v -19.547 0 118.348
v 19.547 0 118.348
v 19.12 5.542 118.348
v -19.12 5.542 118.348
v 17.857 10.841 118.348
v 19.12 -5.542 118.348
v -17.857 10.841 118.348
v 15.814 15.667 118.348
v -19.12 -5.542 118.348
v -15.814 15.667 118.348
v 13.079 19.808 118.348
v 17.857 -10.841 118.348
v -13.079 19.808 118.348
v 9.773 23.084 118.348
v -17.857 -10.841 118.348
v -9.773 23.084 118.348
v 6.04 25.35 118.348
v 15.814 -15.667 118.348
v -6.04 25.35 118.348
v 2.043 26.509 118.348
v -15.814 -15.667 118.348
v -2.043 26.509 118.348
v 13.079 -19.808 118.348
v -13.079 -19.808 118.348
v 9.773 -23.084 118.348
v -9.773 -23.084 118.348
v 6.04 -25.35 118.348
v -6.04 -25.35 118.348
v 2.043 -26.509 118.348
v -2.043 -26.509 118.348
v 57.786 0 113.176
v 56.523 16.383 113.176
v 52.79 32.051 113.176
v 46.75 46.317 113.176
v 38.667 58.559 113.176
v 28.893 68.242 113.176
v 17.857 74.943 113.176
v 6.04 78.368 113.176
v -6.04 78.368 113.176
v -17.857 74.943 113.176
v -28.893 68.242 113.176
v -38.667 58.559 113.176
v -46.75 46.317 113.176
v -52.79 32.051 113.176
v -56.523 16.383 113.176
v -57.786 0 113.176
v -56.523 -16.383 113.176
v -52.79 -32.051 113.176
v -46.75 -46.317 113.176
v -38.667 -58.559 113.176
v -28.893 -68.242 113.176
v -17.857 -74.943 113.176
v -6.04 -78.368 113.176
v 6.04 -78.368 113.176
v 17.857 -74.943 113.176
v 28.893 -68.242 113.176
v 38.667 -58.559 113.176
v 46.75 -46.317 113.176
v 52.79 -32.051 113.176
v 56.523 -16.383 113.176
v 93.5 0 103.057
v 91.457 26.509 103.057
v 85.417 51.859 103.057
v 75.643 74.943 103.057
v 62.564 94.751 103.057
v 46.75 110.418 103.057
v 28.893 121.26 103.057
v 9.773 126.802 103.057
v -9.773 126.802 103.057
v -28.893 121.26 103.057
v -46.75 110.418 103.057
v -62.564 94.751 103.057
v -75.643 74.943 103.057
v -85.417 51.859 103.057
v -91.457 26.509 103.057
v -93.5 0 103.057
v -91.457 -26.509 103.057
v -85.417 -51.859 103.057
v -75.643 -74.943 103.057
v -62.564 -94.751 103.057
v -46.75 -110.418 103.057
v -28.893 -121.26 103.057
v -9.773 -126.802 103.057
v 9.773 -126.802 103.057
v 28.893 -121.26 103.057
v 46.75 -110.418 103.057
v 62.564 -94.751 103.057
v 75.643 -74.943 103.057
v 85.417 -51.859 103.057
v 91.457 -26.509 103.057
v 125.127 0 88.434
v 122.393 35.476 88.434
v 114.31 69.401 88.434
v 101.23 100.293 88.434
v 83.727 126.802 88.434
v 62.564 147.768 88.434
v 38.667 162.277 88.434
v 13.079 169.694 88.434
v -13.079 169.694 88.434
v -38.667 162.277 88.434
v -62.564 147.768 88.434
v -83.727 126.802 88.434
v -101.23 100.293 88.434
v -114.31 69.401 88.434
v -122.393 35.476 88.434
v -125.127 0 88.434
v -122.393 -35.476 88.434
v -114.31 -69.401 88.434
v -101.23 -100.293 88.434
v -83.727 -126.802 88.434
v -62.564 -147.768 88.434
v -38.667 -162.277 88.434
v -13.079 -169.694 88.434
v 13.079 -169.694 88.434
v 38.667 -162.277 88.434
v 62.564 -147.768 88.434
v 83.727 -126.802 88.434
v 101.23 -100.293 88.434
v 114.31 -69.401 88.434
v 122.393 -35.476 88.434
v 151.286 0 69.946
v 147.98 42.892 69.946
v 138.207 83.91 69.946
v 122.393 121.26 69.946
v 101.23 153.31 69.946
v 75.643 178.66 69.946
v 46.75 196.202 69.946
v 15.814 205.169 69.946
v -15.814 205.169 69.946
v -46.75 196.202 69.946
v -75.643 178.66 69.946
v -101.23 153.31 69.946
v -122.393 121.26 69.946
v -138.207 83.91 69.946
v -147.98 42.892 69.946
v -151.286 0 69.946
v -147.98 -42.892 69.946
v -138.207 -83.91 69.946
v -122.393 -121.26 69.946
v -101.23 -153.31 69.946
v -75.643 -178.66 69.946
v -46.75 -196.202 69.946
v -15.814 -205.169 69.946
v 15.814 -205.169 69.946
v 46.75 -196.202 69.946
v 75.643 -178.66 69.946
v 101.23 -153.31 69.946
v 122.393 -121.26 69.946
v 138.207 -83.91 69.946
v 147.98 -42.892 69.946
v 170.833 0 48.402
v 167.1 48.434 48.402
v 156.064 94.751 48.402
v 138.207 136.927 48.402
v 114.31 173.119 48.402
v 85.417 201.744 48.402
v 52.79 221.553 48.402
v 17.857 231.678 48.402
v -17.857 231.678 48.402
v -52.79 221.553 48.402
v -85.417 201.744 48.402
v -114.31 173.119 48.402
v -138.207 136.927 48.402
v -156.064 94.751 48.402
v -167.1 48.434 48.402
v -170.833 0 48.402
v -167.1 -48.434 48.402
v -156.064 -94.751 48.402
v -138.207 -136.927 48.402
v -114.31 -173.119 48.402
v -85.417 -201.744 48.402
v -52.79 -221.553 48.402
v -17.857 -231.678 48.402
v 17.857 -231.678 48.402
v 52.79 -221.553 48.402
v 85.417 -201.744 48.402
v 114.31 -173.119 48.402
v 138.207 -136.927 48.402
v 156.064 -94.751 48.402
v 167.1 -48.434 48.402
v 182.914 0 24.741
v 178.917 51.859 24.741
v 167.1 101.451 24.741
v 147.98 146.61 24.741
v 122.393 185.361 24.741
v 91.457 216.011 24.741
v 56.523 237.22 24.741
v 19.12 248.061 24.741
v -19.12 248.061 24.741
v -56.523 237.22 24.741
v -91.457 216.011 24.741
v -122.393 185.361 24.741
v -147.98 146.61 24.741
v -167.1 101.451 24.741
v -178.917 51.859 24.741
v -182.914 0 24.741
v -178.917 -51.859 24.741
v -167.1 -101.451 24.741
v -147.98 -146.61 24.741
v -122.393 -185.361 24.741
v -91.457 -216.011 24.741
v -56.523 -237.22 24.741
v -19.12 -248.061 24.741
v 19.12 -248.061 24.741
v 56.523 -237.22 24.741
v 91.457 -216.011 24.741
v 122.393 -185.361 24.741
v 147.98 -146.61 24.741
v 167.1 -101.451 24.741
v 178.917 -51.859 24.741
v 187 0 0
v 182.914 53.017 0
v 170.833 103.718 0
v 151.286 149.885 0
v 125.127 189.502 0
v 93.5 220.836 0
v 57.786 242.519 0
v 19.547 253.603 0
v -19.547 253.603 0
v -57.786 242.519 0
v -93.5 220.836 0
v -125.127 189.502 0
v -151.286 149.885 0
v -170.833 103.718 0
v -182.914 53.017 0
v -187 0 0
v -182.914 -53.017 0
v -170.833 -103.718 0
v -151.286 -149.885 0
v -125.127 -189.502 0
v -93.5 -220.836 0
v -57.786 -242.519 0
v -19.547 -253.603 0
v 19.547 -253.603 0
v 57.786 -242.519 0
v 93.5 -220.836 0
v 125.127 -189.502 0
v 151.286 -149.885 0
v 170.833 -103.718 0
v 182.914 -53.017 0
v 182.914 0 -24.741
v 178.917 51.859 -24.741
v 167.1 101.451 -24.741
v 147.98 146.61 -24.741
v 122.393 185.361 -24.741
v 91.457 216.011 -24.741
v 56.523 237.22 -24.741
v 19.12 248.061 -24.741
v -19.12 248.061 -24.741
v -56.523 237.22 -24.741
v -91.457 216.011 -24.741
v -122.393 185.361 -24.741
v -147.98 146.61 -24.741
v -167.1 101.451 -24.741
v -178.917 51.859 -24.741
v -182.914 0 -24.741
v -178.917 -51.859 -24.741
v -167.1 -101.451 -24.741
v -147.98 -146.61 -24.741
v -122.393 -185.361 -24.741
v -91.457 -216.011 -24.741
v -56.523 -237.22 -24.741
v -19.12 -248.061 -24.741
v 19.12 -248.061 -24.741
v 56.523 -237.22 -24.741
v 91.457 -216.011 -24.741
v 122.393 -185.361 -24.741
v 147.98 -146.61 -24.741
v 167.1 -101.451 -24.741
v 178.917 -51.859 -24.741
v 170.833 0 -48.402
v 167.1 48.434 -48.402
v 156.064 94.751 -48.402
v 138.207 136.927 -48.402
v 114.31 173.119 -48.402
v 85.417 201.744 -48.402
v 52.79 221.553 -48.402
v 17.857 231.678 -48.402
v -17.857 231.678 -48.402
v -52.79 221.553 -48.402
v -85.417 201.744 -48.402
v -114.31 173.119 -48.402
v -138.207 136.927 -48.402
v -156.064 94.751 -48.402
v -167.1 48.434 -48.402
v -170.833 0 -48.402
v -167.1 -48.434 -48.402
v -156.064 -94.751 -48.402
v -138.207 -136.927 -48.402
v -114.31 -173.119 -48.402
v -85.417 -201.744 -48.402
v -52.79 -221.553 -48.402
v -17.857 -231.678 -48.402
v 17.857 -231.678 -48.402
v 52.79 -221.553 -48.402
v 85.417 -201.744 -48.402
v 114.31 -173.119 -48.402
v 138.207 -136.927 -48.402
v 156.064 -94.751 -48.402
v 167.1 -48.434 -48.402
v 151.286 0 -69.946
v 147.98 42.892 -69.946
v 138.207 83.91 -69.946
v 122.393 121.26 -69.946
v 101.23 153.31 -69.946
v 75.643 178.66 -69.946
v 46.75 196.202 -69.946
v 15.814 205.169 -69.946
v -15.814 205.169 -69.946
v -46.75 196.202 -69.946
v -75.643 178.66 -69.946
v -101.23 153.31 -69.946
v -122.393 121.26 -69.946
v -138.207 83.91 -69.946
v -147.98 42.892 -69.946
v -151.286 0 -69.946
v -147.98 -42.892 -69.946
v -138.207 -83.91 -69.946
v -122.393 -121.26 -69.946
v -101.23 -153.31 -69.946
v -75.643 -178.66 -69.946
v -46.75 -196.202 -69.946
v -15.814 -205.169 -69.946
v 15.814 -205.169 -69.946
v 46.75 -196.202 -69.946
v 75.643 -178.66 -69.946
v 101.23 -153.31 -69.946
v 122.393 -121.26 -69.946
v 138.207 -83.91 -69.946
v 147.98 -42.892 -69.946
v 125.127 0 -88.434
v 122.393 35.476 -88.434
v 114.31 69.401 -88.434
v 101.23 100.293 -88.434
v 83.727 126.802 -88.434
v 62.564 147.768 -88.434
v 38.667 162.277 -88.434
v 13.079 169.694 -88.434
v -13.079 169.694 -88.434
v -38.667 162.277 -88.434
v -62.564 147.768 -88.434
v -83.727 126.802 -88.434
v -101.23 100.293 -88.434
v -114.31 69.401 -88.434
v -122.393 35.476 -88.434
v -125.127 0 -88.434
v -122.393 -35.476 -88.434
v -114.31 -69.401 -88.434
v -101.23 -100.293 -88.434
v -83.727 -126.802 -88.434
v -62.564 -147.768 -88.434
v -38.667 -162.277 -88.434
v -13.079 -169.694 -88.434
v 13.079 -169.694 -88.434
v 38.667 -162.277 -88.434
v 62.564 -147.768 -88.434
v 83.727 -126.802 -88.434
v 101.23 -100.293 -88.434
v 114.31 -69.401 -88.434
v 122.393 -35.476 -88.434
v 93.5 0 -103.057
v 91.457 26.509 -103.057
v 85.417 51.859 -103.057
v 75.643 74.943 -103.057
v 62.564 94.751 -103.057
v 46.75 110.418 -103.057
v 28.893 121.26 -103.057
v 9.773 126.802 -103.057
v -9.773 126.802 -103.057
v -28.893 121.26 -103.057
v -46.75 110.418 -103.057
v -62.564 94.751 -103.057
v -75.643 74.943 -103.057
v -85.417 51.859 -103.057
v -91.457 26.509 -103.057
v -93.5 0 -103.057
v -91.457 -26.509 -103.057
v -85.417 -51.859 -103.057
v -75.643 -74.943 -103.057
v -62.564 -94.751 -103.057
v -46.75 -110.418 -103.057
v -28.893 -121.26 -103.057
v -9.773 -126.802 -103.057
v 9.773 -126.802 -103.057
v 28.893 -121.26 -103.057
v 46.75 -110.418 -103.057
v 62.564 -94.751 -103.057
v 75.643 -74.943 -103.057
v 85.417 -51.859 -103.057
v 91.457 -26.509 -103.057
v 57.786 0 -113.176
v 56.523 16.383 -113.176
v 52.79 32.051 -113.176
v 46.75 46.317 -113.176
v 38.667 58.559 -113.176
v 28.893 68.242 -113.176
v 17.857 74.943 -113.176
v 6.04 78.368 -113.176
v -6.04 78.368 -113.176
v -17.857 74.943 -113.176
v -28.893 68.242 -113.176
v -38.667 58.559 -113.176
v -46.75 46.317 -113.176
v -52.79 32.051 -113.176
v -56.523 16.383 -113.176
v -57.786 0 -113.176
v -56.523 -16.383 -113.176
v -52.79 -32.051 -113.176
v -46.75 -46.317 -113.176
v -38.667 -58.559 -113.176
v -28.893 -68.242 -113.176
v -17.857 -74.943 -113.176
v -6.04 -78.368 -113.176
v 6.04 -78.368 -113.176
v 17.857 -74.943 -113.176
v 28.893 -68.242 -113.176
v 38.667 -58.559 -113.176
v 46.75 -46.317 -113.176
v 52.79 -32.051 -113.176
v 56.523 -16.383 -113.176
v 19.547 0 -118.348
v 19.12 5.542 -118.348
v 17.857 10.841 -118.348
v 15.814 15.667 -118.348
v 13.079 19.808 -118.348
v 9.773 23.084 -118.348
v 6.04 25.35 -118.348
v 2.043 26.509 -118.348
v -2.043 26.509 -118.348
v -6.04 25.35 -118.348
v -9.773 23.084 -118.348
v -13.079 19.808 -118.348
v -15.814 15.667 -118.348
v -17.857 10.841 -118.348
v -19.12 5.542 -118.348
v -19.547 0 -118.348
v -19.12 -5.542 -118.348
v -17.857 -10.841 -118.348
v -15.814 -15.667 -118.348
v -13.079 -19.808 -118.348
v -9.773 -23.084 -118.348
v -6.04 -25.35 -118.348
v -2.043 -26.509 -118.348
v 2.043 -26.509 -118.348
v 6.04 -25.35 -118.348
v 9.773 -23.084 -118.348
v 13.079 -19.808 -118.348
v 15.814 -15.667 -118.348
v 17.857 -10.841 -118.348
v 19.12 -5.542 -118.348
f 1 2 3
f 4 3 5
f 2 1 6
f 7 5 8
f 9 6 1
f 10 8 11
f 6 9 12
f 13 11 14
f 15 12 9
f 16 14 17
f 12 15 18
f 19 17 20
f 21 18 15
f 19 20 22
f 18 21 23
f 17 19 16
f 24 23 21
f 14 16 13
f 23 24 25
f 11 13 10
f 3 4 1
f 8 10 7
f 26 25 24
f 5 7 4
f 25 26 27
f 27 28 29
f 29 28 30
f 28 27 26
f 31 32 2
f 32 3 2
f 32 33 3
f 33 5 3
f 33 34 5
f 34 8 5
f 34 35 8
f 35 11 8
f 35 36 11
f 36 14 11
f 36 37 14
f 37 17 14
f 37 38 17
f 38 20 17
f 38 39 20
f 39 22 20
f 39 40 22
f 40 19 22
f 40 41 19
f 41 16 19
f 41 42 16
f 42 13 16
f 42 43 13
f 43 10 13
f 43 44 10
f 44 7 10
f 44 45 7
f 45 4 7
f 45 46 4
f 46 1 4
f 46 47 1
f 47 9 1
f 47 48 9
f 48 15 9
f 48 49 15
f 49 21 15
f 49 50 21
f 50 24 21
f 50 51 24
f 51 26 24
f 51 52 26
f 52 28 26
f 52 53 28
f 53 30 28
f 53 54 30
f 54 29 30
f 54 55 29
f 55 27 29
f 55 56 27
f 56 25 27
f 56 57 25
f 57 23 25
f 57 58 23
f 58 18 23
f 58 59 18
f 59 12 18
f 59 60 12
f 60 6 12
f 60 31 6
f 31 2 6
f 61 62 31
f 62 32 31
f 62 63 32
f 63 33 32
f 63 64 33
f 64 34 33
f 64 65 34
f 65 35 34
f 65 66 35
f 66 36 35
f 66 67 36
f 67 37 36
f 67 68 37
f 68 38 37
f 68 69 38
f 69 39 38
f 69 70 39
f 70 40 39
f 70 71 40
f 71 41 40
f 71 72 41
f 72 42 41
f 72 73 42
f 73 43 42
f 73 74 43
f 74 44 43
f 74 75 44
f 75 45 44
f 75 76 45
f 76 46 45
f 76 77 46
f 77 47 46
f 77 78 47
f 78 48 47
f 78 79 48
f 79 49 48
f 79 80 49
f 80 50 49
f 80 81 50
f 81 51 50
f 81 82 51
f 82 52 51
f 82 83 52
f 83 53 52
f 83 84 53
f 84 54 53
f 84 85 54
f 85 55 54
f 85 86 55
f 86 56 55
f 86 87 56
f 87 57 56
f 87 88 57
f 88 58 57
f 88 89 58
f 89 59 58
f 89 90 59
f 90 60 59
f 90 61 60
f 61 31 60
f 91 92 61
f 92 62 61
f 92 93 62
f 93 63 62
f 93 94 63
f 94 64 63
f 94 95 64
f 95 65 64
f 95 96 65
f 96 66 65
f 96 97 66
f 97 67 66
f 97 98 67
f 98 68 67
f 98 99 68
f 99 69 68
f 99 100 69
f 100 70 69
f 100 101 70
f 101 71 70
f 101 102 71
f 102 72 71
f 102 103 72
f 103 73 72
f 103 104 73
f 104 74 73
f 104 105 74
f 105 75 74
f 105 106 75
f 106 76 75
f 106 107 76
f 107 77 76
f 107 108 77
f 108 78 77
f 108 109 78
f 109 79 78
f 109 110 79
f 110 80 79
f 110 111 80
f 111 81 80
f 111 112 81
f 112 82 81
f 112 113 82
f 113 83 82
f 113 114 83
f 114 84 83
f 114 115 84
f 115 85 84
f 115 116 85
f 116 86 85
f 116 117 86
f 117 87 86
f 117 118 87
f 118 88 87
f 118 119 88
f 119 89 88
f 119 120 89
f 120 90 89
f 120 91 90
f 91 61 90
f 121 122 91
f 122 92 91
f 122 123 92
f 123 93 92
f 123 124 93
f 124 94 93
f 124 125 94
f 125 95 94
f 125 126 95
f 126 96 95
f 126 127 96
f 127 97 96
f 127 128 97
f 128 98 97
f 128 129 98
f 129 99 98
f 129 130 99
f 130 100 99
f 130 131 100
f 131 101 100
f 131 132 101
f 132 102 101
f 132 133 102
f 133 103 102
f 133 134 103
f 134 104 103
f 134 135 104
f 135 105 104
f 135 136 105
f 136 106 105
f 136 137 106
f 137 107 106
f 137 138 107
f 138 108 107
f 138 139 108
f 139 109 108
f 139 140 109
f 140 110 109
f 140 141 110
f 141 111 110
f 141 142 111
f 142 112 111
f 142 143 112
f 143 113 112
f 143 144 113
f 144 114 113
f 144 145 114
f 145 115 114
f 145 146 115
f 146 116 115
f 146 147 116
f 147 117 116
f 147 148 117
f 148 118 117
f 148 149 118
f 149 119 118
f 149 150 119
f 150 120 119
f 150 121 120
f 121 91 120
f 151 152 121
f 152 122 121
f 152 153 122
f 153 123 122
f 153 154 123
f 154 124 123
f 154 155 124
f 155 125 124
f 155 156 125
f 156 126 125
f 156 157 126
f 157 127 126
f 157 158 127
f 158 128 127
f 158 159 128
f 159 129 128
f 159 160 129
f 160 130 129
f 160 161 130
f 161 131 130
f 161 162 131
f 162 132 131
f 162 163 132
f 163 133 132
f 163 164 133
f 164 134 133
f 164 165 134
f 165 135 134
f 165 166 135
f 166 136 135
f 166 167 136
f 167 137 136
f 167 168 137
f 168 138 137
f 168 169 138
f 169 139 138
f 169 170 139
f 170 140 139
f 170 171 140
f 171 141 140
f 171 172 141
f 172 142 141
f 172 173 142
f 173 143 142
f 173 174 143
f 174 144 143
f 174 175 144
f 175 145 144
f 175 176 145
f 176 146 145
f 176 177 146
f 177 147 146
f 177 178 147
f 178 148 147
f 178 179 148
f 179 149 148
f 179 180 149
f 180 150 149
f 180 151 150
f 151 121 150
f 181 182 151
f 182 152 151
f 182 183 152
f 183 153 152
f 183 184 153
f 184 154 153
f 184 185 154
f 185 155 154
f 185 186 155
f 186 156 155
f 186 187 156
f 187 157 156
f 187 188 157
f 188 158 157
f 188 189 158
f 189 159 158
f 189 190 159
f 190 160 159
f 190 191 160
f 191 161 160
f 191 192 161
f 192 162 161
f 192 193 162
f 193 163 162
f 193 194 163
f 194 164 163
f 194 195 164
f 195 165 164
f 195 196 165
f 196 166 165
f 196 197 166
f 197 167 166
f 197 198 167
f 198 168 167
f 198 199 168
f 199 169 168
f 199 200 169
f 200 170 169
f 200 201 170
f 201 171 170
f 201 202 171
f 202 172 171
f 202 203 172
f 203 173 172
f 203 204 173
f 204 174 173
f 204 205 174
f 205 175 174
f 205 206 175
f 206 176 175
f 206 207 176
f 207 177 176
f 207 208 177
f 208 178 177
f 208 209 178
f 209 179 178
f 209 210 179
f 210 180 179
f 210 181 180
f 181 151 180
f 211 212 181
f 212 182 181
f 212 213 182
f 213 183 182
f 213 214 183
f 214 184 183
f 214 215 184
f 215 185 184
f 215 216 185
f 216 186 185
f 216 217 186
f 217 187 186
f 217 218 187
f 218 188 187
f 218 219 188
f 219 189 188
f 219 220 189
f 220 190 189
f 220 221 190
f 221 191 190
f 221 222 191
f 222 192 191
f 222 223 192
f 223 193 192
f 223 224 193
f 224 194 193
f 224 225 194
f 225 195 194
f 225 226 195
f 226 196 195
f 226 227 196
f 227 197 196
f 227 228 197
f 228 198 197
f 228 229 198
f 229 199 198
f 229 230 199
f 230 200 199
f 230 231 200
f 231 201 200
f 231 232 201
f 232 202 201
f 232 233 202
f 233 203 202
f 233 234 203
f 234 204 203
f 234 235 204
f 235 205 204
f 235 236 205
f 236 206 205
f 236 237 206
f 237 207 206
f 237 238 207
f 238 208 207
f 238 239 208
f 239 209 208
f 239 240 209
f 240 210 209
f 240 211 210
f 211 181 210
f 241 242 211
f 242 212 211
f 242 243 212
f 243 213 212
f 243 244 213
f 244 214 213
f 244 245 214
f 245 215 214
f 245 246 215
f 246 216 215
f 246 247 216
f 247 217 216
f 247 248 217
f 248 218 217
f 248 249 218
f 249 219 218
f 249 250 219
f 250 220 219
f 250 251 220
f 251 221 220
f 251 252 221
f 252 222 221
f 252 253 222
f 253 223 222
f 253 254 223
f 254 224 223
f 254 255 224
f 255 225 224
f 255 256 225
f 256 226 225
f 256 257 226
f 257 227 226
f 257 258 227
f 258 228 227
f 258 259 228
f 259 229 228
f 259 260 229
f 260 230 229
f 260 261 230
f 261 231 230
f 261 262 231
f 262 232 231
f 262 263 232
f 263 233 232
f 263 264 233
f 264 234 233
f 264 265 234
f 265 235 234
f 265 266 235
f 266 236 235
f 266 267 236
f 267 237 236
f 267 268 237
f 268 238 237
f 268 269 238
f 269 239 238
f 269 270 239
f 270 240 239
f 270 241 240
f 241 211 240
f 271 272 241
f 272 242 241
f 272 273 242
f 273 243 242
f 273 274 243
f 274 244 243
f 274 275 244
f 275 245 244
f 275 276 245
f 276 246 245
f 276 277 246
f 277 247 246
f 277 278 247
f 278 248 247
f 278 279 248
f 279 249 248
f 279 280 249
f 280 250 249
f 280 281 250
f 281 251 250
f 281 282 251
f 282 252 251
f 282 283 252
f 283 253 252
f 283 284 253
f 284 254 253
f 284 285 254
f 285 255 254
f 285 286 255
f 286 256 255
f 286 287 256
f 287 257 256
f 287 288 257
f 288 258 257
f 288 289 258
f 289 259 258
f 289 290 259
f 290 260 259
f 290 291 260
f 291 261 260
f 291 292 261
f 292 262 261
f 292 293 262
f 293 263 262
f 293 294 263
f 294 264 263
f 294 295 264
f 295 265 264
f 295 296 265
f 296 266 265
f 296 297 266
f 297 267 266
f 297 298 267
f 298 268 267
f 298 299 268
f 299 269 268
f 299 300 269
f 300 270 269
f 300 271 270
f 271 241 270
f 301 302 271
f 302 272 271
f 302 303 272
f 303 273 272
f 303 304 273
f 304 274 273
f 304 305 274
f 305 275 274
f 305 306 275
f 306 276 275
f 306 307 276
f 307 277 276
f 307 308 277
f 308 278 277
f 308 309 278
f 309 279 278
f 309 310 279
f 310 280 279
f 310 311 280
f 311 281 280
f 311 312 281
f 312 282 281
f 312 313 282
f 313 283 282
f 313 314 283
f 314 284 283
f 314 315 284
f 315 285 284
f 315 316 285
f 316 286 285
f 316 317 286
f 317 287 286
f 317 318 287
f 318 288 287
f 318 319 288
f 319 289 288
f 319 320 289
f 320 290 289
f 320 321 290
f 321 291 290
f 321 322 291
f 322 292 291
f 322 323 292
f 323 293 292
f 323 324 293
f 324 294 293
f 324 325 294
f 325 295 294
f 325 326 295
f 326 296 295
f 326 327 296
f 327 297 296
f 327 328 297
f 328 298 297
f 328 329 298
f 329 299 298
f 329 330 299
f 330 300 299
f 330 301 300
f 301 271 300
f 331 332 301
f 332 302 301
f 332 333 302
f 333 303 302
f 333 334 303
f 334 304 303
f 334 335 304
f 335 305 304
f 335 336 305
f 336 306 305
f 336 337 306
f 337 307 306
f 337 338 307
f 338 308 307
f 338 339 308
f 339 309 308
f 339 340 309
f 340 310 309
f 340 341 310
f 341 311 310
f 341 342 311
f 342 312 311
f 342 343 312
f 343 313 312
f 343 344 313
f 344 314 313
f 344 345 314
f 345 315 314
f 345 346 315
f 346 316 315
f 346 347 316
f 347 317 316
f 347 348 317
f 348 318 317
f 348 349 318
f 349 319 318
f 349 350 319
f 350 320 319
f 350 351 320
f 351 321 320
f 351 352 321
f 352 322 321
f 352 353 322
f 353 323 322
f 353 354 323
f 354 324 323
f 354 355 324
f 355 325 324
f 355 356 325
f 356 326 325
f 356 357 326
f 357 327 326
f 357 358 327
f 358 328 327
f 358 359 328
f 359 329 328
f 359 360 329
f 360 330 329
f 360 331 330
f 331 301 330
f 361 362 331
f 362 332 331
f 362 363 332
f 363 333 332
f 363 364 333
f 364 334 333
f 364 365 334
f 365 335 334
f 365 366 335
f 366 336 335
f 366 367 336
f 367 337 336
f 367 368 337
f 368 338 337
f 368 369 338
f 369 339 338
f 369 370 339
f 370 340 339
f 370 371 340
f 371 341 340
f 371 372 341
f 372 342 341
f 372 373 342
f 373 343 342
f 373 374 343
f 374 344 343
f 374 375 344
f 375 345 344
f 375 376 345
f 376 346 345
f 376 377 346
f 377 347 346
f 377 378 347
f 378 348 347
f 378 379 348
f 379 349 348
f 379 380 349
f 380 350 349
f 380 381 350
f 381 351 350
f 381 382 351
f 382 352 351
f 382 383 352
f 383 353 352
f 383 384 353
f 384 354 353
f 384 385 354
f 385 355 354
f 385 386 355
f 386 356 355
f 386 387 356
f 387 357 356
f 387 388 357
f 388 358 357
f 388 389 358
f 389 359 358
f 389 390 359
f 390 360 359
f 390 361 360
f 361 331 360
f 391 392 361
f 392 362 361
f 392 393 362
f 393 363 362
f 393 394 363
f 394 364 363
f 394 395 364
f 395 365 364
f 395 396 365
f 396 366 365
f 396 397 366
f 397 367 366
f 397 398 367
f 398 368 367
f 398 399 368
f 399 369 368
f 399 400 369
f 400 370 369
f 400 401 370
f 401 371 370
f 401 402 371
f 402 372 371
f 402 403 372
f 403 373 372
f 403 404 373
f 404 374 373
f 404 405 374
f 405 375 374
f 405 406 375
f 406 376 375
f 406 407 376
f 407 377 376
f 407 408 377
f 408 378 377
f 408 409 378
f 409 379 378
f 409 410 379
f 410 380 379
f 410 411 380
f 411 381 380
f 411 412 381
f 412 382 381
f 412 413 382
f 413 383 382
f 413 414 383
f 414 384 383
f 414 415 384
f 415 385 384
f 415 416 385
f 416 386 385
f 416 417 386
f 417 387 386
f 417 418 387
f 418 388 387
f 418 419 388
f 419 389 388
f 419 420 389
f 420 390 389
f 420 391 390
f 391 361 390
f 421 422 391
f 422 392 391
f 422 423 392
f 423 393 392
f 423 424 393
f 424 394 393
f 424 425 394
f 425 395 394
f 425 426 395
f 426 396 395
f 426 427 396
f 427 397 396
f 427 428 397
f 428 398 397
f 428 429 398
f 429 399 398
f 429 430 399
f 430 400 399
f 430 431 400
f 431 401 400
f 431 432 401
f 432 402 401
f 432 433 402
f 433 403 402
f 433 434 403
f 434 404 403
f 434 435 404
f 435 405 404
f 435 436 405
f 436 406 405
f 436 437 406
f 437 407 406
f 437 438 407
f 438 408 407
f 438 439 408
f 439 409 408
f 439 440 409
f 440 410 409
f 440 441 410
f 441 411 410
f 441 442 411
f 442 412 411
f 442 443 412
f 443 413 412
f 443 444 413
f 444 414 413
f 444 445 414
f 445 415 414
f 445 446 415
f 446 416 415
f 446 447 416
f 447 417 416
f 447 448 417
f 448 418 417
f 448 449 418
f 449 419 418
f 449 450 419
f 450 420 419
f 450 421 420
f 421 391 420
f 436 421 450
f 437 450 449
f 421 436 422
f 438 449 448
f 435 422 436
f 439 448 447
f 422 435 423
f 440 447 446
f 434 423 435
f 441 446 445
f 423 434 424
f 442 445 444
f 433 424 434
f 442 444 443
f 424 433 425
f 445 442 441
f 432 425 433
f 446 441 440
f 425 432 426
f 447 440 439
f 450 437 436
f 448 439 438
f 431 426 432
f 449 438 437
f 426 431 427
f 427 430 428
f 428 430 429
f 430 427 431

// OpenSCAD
// Generated by SolidPython 1.0.1 on 2020-07-29 00:46:50


scale(v = [11, 15, 7]) {
	sphere(r = 17);
}
/***********************************************
*********      SolidPython code:      **********
************************************************
 
# import packages: SolidPython
from solid import *
from solid.utils import *
from itertools import chain, combinations, permutations


class Resize:

    def __init__(self, scad_file):
        self.scad_file = scad_file
        #self.scad_file = import_scad(scad_file)
        # cone/cylinder param:
        self.r1 = 0
        self.r2 = 0
        self.h = 0
        # rectangular prism param:
        self.w = 0
        self.l = 0
        # ellipse param:
        self.r = 0

    # import OpenScad code (file name corresponds to shape)


    # classify shape + parameters
    def assign(self, param1, param2, param3):
        if self.scad_file == 'cone.scad':
            self.r1 = param1
            self.r2 = param2
            self.h = param3
        elif self.scad_file == 'cylinder.scad':
            self.r1 = param1
            self.r2 = param2
            self.h = param3
        elif self.scad_file == 'rectangularPrism.scad':
            self.h = param1
            self.l = param2
            self.w = param3
        else:
            self.r = param1
            self.h = param2

    # resize parameters
    def iterate(self):
        x = range(3, 20, 2)
        i = 1
        if self.scad_file == 'cone.scad':
            tempList = list(permutations(x, 2))
            for temp in tempList:
                param1 = temp[0]
                param2 = temp[1]
                filepath = 'produced_scad_files/' + 'cone' + str(param1) + '_' + str(param2) + '_' + '.scad'
                scad_render_to_file(cylinder(h=param1, r1=param2, r2=0), filepath)

        elif self.scad_file == 'cylinder.scad':
            tempList = list(permutations(x, 3))
            for temp in tempList:
                param1 = temp[0]
                param2 = temp[1]
                filepath = 'produced_scad_files/' + 'cylinder' + str(param1) + '_' + str(param2) + '_' + '.scad'
                scad_render_to_file(cylinder(h=param1, r1=param2, r2=param2), filepath)

        elif self.scad_file == 'rectangularPrism.scad':
            tempList = list(permutations(x, 3))
            for temp in tempList:
                param1 = temp[0]
                param2 = temp[1]
                param3 = temp[2]
                filepath = 'produced_scad_files/' + 'rectangularPrism' + str(param1) + '_' + str(param2) + '_' + str(
                    param3) + '.scad'
                scad_render_to_file(cube(size=(param1, param2, param3)), filepath)

        elif self.scad_file == 'ellipse.scad':
            tempList = list(permutations(x, 4))
            for temp in tempList:
                param1 = temp[0]
                param2 = temp[1]
                param3 = temp[2]
                param4 = temp[3]
                filepath = 'produced_scad_files/' + 'ellipse' + str(param1) + '_' + str(param2) + '_' + str(param3) + '_' + str(param4) + '.scad'
                scad_render_to_file(scale([param1, param2, param3])(sphere(r=param4)), filepath)

    def render_to_scadfile(self):
        scad_render_to_file(scad, 'example.scad') 
 
************************************************/
